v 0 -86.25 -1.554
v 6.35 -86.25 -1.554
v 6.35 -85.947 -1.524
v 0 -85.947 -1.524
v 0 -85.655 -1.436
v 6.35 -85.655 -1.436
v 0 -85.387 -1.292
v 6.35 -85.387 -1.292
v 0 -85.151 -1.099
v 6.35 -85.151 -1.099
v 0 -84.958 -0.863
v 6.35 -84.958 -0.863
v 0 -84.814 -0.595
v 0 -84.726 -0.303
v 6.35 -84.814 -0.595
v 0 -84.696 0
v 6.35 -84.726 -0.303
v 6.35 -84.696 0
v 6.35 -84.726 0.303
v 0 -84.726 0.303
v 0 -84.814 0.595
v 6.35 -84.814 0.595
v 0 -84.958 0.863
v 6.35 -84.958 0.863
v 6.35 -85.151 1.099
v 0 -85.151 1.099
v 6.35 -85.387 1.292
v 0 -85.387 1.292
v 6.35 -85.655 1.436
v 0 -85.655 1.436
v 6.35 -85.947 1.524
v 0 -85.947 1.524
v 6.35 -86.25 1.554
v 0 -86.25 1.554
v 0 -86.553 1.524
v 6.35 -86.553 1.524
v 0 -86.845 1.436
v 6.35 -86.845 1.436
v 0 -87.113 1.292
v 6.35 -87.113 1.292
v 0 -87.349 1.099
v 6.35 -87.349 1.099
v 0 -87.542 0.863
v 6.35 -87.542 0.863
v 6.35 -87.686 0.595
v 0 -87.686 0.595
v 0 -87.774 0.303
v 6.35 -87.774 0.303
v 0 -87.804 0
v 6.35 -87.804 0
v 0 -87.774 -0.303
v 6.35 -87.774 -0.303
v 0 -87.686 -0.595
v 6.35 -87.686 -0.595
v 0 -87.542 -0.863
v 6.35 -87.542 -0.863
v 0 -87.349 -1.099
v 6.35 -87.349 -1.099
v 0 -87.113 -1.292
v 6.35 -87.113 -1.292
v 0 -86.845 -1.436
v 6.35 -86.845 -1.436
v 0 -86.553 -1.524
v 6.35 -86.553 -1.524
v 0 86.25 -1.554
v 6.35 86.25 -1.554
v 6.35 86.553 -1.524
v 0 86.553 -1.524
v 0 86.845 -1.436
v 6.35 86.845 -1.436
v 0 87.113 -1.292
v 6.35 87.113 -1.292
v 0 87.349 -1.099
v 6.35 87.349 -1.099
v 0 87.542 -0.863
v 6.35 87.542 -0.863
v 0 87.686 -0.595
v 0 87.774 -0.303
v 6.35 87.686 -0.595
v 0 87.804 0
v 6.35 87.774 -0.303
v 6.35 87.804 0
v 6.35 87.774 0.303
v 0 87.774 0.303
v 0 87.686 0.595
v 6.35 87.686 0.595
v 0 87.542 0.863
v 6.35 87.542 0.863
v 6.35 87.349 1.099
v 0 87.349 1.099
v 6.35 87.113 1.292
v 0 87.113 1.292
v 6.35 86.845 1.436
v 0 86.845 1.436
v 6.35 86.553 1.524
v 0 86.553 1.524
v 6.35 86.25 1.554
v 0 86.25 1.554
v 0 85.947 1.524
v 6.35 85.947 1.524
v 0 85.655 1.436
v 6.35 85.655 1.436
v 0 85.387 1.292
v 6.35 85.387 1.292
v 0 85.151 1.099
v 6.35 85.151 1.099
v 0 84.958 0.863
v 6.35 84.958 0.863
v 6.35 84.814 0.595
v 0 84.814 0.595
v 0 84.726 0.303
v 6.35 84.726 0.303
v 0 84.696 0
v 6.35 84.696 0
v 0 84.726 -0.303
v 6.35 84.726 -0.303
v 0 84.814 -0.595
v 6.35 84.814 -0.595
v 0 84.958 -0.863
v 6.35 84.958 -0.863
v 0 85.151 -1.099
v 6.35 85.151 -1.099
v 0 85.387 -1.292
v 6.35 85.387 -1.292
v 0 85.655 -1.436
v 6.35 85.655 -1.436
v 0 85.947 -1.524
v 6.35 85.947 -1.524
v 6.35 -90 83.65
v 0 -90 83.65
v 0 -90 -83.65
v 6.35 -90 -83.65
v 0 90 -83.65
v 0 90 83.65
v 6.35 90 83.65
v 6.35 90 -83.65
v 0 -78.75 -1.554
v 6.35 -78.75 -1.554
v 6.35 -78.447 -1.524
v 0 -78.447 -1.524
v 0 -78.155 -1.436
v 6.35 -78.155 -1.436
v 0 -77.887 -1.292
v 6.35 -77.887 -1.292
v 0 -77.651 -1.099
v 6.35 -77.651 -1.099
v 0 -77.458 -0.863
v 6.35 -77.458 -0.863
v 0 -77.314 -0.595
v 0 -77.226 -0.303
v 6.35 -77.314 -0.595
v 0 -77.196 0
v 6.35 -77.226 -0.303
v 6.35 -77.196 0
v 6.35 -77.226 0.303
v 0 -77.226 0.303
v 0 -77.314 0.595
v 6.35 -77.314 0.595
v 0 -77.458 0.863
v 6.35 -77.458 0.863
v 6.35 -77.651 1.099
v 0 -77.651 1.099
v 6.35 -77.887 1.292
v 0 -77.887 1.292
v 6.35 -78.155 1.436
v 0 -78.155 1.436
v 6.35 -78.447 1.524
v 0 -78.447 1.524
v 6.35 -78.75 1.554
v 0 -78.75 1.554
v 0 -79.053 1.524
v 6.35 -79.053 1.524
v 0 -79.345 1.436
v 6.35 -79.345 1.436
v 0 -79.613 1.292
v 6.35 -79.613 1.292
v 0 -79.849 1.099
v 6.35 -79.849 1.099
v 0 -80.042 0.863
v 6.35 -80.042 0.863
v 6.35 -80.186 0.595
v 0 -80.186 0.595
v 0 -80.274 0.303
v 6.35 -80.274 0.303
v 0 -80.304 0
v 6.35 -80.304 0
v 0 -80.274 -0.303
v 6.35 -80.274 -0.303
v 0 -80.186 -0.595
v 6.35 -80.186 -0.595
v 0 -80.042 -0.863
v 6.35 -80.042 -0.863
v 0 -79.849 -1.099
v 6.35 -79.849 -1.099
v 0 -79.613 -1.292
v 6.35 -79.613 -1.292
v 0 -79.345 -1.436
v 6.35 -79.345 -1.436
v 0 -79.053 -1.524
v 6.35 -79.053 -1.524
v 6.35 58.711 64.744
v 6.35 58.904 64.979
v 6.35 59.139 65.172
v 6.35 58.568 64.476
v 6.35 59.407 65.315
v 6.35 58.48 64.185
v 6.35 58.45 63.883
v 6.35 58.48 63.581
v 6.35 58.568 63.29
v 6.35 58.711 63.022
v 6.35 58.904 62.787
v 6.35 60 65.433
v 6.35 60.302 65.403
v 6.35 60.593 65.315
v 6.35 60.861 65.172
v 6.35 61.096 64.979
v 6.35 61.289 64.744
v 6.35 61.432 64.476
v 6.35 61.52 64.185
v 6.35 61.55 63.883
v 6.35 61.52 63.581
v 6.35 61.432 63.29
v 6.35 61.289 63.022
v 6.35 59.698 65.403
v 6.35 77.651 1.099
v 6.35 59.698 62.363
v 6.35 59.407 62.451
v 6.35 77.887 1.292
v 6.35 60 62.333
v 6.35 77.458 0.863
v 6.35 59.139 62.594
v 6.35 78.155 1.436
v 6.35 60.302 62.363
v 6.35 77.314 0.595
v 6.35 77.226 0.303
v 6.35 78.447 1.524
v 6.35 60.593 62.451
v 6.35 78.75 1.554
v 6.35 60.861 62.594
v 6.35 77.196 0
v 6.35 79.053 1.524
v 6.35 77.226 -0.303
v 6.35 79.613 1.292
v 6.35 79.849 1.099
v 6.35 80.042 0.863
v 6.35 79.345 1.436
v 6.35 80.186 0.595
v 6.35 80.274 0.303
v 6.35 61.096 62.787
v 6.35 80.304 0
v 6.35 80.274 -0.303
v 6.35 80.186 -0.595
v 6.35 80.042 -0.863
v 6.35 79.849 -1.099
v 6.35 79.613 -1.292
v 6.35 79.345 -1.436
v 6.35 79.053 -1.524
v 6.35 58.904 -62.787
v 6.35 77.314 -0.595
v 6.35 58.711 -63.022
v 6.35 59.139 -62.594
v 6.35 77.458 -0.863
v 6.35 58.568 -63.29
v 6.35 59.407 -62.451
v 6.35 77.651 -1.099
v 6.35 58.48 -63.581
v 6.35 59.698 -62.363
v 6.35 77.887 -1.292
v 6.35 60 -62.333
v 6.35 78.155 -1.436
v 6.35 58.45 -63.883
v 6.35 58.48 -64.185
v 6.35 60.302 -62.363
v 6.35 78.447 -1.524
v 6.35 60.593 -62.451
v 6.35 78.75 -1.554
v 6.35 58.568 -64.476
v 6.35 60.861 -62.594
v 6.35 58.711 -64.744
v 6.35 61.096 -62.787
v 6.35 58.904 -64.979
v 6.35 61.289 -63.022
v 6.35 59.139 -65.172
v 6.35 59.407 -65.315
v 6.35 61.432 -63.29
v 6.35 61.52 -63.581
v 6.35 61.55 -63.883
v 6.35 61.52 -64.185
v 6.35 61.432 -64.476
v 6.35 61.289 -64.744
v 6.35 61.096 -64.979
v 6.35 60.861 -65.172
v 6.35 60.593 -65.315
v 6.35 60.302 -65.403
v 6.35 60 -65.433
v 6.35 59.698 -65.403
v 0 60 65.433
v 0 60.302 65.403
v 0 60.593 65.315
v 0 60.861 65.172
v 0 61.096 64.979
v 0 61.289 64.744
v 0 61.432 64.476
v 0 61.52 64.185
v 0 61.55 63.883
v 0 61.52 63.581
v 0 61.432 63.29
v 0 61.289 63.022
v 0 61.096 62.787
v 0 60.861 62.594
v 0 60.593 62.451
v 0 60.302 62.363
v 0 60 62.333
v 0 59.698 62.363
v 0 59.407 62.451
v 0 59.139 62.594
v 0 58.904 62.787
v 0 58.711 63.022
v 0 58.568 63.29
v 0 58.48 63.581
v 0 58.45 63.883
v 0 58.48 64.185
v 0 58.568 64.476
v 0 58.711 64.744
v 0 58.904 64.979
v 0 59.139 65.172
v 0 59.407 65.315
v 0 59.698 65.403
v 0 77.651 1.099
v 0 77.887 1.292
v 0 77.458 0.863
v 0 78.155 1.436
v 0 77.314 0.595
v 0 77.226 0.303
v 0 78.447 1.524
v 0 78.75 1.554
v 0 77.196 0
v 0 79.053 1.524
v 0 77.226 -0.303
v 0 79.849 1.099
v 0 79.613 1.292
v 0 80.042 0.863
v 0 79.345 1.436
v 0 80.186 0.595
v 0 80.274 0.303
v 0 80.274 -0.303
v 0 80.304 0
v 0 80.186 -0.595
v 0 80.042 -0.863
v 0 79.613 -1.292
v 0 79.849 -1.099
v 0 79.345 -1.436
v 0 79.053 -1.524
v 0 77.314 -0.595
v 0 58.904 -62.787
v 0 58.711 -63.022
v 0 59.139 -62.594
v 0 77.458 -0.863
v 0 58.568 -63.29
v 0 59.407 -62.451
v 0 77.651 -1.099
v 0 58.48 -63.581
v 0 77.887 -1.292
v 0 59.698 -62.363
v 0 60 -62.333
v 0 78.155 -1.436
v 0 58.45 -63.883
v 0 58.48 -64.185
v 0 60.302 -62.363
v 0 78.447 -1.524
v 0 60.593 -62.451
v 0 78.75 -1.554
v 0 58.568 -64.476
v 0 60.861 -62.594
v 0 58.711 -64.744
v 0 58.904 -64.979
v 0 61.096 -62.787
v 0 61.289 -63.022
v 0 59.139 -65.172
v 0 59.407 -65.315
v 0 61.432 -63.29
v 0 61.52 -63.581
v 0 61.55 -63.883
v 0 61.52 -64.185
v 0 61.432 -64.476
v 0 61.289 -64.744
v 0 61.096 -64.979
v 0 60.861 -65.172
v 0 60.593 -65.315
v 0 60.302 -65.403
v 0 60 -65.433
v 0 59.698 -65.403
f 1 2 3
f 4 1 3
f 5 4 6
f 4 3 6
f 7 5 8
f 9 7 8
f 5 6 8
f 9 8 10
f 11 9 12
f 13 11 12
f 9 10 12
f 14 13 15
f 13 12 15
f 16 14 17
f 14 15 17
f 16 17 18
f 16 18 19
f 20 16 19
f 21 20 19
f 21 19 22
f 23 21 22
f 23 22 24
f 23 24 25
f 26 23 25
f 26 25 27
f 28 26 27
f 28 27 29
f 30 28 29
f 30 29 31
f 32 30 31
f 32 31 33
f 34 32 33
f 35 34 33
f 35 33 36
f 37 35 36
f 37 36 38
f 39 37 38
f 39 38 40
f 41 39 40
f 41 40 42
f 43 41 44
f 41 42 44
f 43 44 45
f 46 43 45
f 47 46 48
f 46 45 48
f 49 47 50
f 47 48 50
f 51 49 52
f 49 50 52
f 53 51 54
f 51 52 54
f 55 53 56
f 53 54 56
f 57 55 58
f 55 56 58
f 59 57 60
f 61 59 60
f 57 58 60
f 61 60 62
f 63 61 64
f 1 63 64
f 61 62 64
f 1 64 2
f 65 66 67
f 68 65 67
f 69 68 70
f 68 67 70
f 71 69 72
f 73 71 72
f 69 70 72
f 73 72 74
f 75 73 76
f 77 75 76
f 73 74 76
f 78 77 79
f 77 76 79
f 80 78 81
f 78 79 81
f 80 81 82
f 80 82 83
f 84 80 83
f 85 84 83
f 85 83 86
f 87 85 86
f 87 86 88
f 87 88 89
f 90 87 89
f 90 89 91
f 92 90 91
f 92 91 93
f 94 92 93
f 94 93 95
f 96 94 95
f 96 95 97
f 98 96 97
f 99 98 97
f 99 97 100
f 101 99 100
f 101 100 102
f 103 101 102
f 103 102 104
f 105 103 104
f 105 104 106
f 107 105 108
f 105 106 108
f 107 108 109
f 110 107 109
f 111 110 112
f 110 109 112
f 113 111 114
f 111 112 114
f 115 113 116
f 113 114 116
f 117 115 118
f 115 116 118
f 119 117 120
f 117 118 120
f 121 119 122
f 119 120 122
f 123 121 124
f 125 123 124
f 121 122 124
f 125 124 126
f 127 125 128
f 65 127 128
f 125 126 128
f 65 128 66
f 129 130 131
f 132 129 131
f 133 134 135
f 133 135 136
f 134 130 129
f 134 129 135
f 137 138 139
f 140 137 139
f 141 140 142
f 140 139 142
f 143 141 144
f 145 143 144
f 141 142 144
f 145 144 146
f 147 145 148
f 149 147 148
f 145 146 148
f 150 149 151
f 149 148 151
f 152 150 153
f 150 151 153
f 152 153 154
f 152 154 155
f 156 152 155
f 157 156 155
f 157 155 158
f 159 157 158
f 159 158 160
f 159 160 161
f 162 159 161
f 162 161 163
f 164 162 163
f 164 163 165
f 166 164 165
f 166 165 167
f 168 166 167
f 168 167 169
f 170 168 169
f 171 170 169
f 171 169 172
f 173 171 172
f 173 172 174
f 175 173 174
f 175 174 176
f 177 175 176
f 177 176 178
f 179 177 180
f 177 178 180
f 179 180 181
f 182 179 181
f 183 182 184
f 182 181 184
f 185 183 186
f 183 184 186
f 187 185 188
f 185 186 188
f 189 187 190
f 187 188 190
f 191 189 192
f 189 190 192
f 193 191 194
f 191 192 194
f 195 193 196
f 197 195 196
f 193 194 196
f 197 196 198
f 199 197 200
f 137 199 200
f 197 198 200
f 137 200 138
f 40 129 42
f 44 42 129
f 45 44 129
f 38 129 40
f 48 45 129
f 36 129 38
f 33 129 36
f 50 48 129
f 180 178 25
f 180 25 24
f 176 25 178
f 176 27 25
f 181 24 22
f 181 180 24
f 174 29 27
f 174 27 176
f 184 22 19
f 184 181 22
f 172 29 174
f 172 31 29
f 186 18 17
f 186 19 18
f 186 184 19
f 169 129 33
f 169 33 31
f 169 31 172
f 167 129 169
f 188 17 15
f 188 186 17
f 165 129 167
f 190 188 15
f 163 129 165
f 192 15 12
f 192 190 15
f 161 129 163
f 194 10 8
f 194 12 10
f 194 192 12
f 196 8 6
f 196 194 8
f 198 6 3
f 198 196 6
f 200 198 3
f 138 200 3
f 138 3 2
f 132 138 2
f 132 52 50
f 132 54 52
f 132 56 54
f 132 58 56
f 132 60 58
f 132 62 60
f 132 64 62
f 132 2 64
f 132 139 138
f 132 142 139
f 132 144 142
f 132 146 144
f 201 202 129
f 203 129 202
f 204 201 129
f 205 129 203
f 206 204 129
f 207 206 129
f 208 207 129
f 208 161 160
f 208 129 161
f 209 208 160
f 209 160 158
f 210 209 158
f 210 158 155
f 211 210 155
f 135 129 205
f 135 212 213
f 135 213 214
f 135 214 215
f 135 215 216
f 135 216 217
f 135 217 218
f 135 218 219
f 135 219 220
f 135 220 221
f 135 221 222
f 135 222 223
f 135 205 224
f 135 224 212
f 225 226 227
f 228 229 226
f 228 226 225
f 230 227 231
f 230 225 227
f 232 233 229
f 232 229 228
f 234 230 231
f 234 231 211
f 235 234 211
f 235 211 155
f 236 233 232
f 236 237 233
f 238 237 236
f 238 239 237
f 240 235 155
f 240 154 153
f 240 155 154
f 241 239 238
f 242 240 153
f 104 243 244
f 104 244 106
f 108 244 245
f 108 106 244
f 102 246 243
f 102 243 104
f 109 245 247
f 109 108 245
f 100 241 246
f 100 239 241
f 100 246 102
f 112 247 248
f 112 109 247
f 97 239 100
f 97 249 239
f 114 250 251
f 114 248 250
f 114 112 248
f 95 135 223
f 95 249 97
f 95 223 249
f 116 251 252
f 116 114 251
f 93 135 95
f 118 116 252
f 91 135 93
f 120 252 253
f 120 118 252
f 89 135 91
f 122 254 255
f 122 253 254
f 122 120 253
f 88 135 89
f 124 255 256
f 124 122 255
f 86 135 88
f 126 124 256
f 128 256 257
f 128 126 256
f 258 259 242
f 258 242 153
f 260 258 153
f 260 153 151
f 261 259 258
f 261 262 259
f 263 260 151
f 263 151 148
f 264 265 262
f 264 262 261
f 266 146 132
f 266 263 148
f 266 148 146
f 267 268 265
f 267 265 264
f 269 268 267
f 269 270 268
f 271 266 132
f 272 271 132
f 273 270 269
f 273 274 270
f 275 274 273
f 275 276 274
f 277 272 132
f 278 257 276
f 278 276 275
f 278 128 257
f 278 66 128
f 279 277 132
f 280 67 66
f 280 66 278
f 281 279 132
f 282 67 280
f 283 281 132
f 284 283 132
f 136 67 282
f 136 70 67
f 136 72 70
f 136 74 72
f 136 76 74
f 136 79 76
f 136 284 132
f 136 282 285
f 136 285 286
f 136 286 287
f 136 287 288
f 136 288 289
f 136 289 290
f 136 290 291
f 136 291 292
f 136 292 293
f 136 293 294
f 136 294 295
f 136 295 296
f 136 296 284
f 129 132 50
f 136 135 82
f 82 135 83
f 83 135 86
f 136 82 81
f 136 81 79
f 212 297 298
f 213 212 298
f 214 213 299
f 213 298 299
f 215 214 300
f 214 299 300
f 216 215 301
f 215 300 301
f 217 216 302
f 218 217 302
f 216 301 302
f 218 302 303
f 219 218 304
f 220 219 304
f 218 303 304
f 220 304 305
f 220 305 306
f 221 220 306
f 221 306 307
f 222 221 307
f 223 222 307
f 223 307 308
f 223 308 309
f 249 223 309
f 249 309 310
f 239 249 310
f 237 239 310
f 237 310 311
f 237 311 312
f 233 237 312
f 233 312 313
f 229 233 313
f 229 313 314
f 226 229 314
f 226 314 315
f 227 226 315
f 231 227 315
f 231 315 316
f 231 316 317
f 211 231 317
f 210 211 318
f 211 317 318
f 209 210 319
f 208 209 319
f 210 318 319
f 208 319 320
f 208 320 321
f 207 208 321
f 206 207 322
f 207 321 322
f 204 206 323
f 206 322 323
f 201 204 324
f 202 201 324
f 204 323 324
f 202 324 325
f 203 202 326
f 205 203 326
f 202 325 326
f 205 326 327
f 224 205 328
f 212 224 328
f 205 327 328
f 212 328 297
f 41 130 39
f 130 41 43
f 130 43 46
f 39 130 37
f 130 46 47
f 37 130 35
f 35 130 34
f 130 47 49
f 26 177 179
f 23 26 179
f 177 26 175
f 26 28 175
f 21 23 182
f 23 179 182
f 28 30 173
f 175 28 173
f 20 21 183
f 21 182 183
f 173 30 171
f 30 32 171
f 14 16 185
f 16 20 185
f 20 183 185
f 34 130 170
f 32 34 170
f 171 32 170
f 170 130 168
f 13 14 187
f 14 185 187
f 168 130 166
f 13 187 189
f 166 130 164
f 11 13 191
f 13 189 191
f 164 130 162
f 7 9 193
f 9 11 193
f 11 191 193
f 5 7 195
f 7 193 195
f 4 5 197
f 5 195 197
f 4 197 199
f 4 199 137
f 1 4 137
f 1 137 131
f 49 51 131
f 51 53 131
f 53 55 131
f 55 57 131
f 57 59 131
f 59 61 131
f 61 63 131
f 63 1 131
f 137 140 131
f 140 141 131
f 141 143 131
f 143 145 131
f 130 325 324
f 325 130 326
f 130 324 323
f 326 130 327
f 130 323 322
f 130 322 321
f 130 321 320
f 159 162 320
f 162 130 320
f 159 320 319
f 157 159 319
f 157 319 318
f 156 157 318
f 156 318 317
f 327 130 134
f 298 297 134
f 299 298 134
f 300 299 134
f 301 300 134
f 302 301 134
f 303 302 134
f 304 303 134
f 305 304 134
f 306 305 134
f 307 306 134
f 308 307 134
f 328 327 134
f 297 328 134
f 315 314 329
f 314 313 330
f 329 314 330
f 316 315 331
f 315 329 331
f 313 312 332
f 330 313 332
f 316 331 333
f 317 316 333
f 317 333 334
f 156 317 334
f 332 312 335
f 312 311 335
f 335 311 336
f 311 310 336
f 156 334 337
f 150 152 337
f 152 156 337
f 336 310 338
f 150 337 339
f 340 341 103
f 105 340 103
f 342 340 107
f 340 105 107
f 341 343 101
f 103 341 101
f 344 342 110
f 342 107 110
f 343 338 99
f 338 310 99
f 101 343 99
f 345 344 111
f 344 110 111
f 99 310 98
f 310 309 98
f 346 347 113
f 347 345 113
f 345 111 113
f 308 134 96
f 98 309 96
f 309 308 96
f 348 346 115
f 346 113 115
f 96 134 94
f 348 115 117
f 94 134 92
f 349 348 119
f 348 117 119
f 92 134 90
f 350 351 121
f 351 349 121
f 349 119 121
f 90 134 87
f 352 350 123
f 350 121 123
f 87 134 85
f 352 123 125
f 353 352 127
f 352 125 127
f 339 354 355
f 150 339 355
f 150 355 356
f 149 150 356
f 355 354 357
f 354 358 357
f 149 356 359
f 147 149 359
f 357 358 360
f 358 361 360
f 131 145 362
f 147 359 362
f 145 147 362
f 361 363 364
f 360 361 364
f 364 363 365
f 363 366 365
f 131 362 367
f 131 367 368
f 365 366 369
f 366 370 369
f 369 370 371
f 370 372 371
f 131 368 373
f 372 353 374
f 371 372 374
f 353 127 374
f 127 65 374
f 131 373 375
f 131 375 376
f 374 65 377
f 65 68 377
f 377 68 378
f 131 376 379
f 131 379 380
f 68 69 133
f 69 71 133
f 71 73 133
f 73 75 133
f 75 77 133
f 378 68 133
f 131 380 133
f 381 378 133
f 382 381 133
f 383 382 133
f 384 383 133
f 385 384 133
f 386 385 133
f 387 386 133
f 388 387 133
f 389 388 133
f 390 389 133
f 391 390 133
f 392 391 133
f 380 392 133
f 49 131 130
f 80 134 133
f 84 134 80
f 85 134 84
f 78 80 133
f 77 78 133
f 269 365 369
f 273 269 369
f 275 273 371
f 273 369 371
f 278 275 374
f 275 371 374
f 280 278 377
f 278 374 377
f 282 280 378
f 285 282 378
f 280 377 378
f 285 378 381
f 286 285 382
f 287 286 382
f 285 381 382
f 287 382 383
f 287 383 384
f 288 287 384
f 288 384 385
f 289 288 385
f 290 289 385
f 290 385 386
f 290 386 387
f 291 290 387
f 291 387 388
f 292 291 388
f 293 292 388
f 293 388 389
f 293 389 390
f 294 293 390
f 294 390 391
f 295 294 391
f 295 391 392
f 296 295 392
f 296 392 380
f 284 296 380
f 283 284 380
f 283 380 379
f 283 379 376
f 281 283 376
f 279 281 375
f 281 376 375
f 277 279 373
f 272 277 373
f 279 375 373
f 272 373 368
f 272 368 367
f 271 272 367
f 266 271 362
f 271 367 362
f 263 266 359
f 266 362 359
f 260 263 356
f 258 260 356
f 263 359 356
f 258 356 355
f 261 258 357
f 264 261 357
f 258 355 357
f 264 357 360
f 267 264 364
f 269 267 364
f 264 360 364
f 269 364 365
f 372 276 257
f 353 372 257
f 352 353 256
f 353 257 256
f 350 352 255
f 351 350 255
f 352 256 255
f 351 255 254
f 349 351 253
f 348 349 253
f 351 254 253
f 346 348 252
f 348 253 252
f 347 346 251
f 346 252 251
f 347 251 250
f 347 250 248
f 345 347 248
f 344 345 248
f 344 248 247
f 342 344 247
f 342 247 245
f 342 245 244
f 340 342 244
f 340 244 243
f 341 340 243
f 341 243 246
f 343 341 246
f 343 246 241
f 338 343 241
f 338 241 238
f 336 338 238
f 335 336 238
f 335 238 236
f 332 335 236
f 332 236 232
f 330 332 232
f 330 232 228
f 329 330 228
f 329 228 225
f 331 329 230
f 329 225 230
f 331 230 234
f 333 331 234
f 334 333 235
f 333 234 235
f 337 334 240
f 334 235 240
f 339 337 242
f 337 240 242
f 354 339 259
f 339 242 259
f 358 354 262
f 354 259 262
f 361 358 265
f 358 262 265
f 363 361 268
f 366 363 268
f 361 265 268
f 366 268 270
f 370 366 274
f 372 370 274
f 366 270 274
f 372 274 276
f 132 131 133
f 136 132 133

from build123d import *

# Parameters (mm, degrees)
SKETCH1_W                       = 167.3
SKETCH1_H                       = 180
BOSS_EXTRUDE1_DEPTH             = 6.35
SKETCH2_R                       = 1.55
CUT_EXTRUDE1_DEPTH              = 124.035137258
F_3_0MM_CLEARANCE_DOWEL_HOLE1_D = 3.108


with BuildPart() as part:
    # Sketch1 → Boss-Extrude1 (new body)
    with BuildSketch(Plane(origin=(0, 0, 0), x_dir=(0, 0, -1), z_dir=(1, 0, 0))):
        Rectangle(SKETCH1_W, SKETCH1_H)
    extrude(amount=BOSS_EXTRUDE1_DEPTH)

    # Sketch2 → Cut-Extrude1 (cut, through all)
    with BuildSketch(Plane.ZY):
        with Locations((-63.88304723, 60)):
            Circle(SKETCH2_R)
        with Locations((63.88304723, 60)):
            Circle(SKETCH2_R)
    extrude(amount=-CUT_EXTRUDE1_DEPTH, mode=Mode.SUBTRACT)

    # Ø3.0mm Clearance Dowel Hole1 (through all)
    with Locations(Plane.ZY):
        with Locations((0, 86.25), (0, 78.75), (0, -78.75), (0, -86.25)):
            Hole(F_3_0MM_CLEARANCE_DOWEL_HOLE1_D / 2)


solid = part.part
